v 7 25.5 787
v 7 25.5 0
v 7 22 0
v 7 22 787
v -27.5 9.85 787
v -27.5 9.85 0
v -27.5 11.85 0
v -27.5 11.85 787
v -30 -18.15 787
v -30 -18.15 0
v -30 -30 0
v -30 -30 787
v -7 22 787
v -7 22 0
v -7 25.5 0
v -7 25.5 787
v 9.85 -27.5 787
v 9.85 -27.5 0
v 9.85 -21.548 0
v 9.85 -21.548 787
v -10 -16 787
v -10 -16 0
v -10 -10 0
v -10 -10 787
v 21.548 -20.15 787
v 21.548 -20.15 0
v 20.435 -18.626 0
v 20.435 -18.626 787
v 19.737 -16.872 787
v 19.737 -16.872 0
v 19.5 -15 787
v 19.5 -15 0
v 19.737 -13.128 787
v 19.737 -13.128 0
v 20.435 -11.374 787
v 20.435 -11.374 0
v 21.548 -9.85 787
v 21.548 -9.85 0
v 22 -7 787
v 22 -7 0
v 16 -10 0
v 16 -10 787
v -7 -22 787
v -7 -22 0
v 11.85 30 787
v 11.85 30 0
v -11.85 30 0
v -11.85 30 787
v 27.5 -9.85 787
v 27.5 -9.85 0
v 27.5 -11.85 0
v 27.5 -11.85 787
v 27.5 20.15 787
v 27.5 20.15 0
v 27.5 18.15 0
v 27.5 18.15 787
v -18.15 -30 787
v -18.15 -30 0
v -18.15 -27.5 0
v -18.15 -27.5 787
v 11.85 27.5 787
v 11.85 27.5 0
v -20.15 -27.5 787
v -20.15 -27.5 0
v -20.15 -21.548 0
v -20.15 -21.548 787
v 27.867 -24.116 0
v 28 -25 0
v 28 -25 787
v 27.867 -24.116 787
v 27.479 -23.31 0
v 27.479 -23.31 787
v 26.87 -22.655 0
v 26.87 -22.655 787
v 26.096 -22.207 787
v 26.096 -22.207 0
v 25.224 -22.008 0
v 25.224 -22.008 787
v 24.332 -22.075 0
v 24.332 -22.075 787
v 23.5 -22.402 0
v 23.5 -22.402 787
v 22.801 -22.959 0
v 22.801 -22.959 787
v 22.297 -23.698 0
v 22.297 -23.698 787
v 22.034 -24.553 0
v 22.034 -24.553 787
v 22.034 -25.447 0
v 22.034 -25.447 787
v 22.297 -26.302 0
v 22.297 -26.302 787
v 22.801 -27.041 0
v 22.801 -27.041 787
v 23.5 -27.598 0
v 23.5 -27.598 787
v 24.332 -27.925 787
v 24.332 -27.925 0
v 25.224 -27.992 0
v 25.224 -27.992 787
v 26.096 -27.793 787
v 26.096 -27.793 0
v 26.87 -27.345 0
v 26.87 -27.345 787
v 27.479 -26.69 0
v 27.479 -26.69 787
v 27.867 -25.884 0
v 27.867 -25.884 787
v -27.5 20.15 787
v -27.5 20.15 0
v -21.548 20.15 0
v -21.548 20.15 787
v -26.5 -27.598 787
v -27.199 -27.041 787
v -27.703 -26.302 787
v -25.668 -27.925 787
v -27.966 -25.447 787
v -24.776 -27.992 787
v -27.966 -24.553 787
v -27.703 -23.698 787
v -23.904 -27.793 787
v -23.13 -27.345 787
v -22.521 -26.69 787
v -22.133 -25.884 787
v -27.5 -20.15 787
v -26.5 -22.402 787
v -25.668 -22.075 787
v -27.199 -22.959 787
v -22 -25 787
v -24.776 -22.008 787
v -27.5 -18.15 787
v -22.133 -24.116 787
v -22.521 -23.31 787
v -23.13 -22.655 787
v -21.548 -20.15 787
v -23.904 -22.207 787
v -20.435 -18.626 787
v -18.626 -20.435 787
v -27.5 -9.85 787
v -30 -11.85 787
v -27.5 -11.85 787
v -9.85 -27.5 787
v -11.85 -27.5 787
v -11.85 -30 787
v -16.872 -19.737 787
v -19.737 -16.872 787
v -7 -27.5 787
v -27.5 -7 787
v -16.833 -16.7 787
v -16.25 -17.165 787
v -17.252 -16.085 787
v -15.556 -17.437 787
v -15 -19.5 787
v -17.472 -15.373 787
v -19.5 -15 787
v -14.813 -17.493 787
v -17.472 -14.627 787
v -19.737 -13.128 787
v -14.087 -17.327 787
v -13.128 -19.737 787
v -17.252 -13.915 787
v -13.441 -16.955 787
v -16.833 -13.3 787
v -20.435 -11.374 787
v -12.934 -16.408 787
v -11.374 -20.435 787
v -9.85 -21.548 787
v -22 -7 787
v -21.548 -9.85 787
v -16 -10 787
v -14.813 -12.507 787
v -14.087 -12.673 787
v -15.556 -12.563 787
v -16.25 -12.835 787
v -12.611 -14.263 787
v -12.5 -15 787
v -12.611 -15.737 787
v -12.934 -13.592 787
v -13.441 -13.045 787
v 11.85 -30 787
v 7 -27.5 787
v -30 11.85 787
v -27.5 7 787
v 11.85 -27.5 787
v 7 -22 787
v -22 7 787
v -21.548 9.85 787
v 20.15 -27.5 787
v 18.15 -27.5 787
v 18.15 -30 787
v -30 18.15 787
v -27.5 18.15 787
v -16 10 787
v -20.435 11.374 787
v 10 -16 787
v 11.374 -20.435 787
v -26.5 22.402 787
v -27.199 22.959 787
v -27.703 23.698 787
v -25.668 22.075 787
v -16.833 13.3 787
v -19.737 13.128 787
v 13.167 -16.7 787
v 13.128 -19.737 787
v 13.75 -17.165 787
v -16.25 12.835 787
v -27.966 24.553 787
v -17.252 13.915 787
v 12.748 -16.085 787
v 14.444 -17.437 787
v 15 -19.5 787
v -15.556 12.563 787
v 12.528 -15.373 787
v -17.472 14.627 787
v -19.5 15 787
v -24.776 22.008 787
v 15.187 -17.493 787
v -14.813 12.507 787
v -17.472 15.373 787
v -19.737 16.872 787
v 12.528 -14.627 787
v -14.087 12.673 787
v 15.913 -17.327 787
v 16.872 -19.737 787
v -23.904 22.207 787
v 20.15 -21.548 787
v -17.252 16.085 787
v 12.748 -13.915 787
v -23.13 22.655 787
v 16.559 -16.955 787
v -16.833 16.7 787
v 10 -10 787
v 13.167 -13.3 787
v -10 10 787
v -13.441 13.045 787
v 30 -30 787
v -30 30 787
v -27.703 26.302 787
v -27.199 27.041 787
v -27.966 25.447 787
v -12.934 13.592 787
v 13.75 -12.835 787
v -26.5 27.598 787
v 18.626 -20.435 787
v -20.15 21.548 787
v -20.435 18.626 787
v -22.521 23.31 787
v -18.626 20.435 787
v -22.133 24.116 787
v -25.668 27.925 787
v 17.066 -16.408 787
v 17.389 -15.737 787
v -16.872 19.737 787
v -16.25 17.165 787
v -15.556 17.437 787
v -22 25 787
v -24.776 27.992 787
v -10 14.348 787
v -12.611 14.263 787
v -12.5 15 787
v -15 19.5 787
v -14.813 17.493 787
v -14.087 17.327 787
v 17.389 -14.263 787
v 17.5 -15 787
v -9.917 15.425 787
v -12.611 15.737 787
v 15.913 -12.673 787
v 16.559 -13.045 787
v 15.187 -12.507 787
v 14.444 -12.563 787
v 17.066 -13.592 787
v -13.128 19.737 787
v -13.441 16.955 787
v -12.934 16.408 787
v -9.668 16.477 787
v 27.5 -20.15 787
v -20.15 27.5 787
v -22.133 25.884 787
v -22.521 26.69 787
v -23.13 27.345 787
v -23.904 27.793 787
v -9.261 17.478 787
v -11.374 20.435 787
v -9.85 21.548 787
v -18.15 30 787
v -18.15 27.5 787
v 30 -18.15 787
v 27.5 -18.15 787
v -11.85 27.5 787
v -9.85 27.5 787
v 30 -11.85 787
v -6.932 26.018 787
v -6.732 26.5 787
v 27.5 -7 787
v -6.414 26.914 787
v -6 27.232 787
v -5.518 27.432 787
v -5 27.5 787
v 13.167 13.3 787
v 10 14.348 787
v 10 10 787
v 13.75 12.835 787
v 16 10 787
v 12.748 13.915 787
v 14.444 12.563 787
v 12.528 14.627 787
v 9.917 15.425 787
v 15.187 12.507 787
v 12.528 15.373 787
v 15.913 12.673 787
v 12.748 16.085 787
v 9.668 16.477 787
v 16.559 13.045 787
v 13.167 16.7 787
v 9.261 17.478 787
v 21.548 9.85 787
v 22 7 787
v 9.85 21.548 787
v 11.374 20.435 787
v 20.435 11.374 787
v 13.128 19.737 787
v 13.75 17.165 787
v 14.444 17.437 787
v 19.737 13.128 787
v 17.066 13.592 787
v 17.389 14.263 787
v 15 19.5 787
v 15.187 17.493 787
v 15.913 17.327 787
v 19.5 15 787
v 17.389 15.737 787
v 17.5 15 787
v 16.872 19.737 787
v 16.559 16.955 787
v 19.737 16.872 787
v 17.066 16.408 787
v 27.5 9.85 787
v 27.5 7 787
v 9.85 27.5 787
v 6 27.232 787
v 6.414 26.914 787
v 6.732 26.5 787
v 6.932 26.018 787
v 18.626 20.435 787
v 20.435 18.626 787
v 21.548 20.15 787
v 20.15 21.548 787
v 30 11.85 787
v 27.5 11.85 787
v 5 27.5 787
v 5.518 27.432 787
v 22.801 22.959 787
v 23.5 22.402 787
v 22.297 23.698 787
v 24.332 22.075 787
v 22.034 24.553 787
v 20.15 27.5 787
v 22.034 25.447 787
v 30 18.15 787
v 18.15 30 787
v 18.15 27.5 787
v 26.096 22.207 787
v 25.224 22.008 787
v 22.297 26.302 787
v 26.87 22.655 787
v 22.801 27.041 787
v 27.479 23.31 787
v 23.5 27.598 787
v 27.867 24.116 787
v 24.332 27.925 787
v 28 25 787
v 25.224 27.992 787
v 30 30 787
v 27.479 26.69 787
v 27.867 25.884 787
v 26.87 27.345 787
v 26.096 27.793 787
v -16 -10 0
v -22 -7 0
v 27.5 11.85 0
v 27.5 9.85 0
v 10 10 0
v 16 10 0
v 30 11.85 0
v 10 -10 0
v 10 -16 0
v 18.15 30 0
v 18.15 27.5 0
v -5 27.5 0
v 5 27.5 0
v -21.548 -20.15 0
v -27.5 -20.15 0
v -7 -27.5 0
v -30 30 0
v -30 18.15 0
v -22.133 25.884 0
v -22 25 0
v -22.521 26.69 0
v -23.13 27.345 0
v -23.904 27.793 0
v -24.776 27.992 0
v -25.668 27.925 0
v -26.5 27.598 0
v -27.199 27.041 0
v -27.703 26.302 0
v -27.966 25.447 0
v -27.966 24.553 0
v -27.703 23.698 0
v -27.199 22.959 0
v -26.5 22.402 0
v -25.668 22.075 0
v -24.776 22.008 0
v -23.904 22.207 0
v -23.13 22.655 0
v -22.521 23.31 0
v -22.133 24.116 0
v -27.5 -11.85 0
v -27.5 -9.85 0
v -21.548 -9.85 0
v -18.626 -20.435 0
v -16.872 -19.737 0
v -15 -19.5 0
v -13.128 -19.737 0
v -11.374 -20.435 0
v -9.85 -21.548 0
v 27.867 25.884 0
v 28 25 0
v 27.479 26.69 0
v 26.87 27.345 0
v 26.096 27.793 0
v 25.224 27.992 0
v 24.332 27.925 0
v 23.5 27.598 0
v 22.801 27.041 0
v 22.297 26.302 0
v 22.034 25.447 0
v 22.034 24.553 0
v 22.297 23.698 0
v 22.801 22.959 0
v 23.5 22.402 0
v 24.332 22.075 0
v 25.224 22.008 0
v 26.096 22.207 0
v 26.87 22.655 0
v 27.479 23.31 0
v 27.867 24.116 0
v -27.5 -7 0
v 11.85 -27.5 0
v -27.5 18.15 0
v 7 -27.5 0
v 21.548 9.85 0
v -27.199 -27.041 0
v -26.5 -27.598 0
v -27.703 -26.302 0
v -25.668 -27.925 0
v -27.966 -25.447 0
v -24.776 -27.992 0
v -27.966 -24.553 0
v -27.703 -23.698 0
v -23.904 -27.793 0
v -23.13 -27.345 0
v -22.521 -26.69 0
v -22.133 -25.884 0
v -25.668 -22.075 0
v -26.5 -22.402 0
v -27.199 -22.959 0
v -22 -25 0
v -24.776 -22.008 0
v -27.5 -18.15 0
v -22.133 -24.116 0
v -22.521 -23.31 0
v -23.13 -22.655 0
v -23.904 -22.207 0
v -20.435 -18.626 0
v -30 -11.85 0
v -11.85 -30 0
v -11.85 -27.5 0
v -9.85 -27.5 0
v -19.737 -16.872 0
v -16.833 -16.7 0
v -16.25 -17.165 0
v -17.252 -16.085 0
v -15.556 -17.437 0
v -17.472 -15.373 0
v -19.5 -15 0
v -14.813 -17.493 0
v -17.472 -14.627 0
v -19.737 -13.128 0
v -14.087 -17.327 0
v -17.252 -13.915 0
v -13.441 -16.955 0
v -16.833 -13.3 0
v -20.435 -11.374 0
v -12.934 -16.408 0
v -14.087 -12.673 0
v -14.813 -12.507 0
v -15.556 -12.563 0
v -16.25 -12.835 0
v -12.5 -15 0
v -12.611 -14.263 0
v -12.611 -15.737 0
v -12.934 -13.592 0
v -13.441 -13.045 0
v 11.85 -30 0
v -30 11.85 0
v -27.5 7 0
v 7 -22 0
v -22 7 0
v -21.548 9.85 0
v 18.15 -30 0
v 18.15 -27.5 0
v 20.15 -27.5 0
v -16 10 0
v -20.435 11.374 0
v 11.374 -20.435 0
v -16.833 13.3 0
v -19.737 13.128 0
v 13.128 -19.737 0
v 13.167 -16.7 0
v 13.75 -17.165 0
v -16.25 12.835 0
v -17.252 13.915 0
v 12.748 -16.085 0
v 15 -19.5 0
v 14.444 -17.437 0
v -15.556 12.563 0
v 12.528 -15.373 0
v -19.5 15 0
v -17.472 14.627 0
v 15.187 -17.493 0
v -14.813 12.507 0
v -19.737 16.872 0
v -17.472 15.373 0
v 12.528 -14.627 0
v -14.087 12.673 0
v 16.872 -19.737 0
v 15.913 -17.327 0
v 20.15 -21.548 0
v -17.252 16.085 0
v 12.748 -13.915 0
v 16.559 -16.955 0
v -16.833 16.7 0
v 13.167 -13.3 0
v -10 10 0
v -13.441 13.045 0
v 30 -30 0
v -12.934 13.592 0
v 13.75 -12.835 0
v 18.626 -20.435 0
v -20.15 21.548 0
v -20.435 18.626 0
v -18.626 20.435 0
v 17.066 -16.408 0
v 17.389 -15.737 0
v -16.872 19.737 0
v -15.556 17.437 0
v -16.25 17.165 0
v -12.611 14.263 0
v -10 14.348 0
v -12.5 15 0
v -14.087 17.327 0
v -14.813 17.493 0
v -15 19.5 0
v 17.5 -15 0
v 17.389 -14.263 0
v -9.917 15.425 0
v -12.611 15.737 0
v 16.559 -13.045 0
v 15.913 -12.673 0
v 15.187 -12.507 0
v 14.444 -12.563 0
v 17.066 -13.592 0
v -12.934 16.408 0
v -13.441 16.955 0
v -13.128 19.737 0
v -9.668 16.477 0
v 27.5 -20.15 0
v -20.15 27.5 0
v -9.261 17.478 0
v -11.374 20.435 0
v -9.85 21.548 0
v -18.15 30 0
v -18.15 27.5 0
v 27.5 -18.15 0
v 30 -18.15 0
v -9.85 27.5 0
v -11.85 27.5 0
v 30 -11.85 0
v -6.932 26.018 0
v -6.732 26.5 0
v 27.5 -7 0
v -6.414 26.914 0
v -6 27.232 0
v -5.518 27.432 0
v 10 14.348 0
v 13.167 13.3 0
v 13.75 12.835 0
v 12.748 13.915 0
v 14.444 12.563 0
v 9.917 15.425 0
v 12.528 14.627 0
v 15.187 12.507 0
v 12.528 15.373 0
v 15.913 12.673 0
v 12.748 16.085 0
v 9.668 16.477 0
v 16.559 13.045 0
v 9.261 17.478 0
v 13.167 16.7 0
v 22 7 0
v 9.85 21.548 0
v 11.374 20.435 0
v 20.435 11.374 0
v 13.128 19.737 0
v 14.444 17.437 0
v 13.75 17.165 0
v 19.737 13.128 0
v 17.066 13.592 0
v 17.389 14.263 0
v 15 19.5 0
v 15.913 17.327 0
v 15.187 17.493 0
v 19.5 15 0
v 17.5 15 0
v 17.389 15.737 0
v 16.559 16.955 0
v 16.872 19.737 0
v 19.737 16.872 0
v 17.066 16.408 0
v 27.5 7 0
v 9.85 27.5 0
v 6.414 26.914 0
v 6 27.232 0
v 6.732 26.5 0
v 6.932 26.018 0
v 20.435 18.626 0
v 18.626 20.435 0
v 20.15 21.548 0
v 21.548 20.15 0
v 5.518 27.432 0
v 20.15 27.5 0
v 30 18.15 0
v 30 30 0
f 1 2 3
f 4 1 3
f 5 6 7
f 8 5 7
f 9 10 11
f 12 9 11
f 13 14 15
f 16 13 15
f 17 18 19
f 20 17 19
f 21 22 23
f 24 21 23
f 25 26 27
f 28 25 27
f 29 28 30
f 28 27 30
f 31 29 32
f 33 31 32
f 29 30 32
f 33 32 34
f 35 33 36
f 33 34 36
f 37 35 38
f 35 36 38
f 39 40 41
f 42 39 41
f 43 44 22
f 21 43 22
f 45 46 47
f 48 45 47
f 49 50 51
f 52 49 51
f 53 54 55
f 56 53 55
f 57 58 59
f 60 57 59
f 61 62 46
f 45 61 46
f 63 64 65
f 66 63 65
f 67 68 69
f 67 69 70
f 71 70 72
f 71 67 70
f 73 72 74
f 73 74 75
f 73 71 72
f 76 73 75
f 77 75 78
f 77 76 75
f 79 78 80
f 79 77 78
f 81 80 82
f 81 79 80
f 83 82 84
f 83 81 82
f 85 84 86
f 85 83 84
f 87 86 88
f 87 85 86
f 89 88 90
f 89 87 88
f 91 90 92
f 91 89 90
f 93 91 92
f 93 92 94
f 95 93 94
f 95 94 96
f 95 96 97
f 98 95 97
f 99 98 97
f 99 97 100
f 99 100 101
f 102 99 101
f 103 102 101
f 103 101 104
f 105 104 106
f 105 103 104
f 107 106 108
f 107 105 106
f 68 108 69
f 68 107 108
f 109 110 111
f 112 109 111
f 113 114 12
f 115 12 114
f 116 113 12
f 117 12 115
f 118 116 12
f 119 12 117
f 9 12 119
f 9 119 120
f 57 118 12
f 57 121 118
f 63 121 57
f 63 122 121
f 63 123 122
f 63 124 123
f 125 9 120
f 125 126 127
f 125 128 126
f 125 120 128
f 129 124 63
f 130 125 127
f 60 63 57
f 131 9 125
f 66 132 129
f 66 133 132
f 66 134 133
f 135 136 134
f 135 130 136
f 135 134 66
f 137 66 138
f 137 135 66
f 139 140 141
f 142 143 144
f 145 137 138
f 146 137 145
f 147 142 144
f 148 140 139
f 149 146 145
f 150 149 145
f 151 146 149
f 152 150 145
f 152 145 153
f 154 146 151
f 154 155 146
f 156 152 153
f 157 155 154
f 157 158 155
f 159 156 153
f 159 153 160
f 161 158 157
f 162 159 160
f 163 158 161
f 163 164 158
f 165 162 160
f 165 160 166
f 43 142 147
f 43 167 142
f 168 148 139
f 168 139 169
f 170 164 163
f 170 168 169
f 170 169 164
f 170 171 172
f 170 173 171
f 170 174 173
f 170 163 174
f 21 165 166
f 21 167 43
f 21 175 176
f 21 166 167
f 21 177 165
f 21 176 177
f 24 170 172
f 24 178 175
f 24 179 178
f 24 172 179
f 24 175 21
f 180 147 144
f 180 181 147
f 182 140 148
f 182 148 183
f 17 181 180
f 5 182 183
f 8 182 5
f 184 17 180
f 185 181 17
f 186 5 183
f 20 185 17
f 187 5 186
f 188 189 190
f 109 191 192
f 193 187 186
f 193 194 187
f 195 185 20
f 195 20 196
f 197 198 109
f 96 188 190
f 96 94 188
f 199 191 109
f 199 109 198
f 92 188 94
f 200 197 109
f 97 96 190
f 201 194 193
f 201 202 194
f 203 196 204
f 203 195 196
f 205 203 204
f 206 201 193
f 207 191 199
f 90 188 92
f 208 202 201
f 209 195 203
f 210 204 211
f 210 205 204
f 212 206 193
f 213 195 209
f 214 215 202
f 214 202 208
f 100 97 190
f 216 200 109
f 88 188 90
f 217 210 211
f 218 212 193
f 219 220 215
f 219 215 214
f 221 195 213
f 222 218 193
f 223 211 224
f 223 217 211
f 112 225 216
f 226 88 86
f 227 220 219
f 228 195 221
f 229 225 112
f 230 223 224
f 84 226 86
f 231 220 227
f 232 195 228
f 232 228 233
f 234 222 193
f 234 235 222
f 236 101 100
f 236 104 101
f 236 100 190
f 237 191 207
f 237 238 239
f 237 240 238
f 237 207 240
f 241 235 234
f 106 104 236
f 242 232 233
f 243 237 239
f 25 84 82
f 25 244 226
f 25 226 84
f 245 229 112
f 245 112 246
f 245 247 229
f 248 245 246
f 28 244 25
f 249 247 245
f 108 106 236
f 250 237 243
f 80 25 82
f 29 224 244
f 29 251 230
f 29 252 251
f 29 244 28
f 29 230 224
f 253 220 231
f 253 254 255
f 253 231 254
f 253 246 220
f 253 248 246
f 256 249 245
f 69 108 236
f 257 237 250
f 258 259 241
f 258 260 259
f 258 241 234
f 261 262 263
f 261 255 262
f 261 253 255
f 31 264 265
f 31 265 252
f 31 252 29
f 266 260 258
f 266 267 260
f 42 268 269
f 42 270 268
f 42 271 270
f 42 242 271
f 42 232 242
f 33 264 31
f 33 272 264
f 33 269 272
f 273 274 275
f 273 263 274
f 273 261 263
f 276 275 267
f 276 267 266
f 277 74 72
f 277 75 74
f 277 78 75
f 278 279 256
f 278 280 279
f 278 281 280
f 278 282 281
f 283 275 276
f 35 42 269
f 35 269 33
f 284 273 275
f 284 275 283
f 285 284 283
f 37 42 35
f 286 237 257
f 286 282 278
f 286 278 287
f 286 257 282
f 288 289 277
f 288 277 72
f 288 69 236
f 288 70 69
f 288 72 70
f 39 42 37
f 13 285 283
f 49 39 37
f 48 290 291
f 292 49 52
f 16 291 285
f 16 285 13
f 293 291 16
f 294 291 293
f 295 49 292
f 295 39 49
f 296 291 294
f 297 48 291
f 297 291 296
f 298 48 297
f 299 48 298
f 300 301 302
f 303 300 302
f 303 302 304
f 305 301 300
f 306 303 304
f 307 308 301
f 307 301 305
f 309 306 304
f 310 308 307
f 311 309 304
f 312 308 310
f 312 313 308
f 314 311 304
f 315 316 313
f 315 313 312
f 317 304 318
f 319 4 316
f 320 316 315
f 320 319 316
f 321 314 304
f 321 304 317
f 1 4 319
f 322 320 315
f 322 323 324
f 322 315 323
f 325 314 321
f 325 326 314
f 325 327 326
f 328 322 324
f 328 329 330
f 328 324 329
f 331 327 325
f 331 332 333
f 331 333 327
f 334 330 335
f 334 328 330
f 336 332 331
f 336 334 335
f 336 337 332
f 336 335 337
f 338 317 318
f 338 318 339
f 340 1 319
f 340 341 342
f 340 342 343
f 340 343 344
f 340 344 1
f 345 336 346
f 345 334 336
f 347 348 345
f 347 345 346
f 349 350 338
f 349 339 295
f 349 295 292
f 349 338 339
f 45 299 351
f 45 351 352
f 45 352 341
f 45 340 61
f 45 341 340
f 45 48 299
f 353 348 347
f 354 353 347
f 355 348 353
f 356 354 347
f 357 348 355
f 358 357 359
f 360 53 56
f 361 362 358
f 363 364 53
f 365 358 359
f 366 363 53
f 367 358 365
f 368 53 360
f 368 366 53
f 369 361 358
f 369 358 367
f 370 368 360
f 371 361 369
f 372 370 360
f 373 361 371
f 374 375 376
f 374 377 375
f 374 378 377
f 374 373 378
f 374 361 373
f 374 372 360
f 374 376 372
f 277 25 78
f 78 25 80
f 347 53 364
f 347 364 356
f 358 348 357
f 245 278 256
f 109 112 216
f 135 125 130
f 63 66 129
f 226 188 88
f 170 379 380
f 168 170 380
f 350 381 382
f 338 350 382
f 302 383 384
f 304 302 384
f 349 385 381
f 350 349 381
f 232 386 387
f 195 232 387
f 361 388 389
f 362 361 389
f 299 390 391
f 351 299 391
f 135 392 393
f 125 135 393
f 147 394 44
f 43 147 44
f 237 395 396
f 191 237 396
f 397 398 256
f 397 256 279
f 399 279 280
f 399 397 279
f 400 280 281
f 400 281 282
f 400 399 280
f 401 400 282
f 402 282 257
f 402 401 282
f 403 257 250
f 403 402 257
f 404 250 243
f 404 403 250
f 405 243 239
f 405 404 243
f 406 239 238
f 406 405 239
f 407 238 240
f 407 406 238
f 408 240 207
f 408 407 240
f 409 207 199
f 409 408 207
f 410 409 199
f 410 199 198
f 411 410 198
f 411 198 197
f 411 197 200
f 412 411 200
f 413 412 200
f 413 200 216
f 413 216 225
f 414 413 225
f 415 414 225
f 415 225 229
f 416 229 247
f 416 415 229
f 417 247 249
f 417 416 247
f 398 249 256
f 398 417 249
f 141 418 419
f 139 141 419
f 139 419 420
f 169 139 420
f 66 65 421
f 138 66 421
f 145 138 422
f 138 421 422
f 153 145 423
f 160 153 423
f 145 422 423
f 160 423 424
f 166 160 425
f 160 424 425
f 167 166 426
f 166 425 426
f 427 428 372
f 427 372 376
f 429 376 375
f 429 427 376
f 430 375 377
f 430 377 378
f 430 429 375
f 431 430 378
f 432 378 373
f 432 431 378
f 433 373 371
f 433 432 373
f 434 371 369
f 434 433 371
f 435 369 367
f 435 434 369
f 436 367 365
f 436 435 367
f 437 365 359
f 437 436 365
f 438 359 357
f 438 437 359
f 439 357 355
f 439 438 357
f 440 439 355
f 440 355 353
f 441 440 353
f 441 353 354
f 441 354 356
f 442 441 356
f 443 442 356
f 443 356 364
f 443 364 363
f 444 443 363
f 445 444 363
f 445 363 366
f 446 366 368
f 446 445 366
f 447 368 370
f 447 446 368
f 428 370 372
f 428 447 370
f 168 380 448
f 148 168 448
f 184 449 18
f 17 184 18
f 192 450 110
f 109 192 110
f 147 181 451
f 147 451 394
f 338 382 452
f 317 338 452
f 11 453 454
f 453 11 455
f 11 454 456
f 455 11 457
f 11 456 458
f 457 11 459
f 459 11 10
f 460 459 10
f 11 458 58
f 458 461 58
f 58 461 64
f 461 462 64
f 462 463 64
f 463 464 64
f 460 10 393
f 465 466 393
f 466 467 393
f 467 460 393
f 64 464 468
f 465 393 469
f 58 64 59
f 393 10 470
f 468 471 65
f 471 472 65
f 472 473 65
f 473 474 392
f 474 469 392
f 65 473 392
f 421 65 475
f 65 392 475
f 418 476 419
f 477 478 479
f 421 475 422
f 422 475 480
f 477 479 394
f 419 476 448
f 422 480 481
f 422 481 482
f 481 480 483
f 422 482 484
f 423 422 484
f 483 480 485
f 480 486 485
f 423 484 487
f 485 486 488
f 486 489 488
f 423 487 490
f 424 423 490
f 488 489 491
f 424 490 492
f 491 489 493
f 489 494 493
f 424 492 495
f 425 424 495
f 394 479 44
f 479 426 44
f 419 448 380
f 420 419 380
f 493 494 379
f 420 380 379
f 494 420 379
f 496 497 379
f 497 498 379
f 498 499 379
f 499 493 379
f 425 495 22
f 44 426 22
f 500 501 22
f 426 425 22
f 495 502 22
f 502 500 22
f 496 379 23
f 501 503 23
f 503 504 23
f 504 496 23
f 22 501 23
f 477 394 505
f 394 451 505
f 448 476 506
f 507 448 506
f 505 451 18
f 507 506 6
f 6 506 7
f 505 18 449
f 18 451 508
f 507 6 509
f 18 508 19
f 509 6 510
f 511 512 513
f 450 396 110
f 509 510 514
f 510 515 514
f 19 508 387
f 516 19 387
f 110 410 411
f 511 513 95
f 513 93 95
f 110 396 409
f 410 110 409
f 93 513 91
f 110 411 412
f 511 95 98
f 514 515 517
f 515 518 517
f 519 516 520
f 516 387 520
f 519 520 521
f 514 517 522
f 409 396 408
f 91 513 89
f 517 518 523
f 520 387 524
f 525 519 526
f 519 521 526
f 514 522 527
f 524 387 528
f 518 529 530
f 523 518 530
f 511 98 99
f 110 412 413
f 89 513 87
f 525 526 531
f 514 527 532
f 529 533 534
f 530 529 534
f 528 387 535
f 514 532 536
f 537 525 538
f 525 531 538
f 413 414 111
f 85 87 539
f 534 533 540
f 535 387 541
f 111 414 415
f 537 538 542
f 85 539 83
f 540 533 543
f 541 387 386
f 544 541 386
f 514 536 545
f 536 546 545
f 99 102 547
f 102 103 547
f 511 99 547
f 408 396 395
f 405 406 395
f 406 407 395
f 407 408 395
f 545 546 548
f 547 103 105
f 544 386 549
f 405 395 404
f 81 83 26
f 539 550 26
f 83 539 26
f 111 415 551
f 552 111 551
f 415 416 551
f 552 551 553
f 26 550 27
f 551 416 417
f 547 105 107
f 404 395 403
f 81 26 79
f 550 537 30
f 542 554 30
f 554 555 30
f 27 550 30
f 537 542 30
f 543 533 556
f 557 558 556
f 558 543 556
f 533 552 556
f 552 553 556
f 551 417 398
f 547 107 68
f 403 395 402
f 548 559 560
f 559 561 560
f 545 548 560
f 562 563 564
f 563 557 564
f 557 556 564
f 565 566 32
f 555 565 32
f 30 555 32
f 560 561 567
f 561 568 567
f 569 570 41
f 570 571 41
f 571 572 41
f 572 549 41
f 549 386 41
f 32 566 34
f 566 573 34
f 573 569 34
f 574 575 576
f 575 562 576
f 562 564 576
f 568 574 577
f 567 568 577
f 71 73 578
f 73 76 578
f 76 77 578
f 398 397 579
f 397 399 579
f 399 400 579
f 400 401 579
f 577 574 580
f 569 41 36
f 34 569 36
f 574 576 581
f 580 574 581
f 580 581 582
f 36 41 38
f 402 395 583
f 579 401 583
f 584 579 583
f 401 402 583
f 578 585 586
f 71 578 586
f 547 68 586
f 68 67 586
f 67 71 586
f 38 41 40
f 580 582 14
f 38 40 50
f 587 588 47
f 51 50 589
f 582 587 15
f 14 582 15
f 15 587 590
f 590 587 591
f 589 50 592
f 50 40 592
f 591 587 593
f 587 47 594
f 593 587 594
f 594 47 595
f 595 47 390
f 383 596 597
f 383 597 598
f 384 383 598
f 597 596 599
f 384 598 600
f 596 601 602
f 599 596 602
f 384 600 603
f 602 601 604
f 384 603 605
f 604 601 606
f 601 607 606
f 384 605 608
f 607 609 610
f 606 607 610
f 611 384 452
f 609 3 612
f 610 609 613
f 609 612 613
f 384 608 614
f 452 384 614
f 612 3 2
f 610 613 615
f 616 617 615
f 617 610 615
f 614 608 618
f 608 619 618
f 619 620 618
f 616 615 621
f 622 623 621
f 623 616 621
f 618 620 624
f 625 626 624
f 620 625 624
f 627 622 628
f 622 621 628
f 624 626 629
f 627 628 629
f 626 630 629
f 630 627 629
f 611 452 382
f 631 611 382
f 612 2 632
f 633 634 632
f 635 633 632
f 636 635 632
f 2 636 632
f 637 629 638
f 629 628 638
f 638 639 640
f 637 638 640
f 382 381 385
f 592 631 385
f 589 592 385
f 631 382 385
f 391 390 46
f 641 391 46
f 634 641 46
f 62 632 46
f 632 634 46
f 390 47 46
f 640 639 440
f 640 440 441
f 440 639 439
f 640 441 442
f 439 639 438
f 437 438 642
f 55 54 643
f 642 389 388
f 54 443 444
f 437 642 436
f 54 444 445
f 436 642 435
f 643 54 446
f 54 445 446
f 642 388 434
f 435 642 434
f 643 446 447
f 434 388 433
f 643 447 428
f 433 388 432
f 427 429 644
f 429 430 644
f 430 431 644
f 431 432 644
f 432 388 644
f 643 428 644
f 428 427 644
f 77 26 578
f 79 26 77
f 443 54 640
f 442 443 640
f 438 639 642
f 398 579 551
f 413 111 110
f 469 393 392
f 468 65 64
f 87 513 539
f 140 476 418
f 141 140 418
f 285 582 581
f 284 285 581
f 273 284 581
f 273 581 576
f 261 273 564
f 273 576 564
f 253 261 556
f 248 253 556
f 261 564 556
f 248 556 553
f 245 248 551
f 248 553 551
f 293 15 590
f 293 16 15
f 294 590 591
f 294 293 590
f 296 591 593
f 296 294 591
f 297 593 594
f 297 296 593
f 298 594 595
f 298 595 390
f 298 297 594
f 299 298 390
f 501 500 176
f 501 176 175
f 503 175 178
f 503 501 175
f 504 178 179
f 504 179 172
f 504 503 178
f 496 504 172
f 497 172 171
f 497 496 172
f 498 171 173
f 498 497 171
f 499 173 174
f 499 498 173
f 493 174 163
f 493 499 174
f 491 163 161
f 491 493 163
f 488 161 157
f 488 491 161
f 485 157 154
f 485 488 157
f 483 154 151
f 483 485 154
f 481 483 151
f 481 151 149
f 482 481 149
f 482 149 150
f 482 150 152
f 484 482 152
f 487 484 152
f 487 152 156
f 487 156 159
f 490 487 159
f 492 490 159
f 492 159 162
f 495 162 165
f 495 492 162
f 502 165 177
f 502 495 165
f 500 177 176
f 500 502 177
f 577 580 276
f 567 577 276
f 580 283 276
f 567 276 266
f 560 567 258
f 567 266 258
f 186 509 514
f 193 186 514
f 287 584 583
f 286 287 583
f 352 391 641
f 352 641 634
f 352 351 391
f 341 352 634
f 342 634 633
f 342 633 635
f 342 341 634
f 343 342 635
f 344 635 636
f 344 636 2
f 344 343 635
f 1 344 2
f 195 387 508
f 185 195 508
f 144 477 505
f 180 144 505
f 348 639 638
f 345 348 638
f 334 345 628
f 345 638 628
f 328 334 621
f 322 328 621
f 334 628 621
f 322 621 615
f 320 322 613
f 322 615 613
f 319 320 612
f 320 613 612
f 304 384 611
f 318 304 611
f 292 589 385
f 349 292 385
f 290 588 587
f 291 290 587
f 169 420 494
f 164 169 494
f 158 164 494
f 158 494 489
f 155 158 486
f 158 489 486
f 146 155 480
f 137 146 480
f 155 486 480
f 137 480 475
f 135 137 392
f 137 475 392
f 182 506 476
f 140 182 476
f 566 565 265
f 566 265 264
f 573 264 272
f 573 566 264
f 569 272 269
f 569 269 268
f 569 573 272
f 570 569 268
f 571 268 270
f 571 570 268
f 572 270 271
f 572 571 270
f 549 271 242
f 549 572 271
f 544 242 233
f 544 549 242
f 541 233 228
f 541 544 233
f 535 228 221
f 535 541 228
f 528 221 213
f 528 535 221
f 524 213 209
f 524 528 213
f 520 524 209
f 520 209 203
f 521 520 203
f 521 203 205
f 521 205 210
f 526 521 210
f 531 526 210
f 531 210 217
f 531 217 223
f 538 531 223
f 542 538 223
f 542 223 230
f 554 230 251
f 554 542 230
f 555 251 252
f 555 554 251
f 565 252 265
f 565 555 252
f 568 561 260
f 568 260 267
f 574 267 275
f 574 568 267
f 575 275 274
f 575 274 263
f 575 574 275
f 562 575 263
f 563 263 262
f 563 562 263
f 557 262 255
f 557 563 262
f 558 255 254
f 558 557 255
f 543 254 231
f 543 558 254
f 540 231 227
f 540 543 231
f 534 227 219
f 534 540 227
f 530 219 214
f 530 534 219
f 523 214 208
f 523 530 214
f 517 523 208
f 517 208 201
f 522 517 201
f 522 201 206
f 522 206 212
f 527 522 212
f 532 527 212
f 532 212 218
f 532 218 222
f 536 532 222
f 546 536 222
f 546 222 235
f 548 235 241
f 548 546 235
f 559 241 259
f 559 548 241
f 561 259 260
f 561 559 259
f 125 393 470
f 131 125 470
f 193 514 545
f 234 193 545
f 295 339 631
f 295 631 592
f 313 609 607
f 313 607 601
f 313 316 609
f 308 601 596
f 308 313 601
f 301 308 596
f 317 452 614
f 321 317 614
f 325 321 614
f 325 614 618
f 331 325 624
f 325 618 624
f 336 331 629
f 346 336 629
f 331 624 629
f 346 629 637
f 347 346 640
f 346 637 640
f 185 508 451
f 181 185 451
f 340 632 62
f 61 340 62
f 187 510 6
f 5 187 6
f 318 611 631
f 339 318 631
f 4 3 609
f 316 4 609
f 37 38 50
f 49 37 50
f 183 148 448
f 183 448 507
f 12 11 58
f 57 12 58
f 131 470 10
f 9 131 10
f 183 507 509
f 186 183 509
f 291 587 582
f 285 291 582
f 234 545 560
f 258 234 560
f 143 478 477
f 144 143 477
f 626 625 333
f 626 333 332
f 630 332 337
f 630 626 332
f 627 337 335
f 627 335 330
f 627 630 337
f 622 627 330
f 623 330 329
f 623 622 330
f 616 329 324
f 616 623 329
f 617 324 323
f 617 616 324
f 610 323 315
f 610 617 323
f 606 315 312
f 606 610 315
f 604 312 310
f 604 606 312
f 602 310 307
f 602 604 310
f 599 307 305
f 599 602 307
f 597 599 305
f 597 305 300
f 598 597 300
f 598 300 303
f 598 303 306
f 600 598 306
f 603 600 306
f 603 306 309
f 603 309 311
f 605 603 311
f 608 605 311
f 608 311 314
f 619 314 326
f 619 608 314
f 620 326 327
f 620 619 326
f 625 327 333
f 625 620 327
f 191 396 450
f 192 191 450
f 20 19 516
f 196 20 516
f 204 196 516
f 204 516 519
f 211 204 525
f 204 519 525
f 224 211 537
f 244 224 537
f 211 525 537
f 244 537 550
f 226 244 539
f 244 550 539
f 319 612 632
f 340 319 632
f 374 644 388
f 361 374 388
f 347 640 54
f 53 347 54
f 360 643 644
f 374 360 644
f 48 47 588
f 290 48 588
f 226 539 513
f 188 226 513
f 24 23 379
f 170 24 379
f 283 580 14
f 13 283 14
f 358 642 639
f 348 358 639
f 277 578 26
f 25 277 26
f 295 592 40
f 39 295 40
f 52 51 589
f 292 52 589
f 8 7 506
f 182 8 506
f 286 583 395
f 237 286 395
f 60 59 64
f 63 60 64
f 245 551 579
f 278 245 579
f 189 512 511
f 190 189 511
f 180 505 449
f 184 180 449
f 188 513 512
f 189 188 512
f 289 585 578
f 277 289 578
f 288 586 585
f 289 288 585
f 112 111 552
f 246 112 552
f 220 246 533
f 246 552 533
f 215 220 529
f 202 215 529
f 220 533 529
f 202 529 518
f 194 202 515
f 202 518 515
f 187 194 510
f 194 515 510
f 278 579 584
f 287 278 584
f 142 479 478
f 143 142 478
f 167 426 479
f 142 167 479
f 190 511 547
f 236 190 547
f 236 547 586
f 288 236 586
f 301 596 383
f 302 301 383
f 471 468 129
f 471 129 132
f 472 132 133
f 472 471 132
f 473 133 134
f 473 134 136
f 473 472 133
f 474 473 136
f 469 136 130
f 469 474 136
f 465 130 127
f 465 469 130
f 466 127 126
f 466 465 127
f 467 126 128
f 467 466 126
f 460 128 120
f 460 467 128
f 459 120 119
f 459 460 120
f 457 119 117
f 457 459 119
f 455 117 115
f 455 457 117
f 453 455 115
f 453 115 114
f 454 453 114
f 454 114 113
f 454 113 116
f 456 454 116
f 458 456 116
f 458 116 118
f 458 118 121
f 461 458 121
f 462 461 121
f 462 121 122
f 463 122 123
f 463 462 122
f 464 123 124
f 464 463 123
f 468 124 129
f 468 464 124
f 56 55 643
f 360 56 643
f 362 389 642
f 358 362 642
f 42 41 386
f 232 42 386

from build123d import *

# Parameters (mm, degrees)
F0_R     = 3
F0_R_2   = 2.5
F1_DEPTH = 787
F2_R     = 2
F3_R     = 7


# Not quite as in the source:
# - a feature names something its author has since deleted; it is built from what else it names


with BuildPart() as f1:
    # F0 (on Top) → F1 (new body)
    with BuildSketch(Plane.XY):
        with BuildLine():
            Line((18.15, -30), (30, -30))
            Line((30, -30), (30, -18.15))
            Line((30, -18.15), (27.5, -18.15))
            Line((27.5, -18.15), (27.5, -20.15))
            Line((27.5, -20.15), (21.5477069044, -20.15))
            ThreePointArc((21.5477069044, -20.15), (19.5, -15), (21.5477069044, -9.85))
            Line((21.5477069044, -9.85), (27.5, -9.85))
            Line((27.5, -9.85), (27.5, -11.85))
            Line((27.5, -11.85), (30, -11.85))
            Line((30, -11.85), (30, 11.85))
            Line((30, 11.85), (27.5, 11.85))
            Line((27.5, 11.85), (27.5, 9.85))
            Line((27.5, 9.85), (21.5477069044, 9.85))
            ThreePointArc((21.5477069044, 9.85), (19.5, 15), (21.5477069044, 20.15))
            Line((21.5477069044, 20.15), (27.5, 20.15))
            Line((27.5, 20.15), (27.5, 18.15))
            Line((27.5, 18.15), (30, 18.15))
            Line((30, 18.15), (30, 30))
            Line((30, 30), (18.15, 30))
            Line((18.15, 30), (18.15, 27.5))
            Line((18.15, 27.5), (20.15, 27.5))
            Line((20.15, 27.5), (20.15, 21.5477069044))
            ThreePointArc((20.15, 21.5477069044), (15, 19.5), (9.85, 21.5477069044))
            Line((9.85, 21.5477069044), (9.85, 27.5))
            Line((9.85, 27.5), (11.85, 27.5))
            Line((11.85, 27.5), (11.85, 30))
            Line((11.85, 30), (-11.85, 30))
            Line((-11.85, 30), (-11.85, 27.5))
            Line((-11.85, 27.5), (-9.85, 27.5))
            Line((-9.85, 27.5), (-9.85, 21.5477069044))
            ThreePointArc((-9.85, 21.5477069044), (-15, 19.5), (-20.15, 21.5477069044))
            Line((-20.15, 21.5477069044), (-20.15, 27.5))
            Line((-20.15, 27.5), (-18.15, 27.5))
            Line((-18.15, 27.5), (-18.15, 30))
            Line((-18.15, 30), (-30, 30))
            Line((-30, 30), (-30, 18.15))
            Line((-30, 18.15), (-27.5, 18.15))
            Line((-27.5, 18.15), (-27.5, 20.15))
            Line((-27.5, 20.15), (-21.5477069044, 20.15))
            ThreePointArc((-21.5477069044, 20.15), (-19.5, 15), (-21.5477069044, 9.85))
            Line((-21.5477069044, 9.85), (-27.5, 9.85))
            Line((-27.5, 9.85), (-27.5, 11.85))
            Line((-27.5, 11.85), (-30, 11.85))
            Line((-30, 11.85), (-30, -11.85))
            Line((-30, -11.85), (-27.5, -11.85))
            Line((-27.5, -11.85), (-27.5, -9.85))
            Line((-27.5, -9.85), (-21.5477069044, -9.85))
            ThreePointArc((-21.5477069044, -9.85), (-19.5, -15), (-21.5477069044, -20.15))
            Line((-21.5477069044, -20.15), (-27.5, -20.15))
            Line((-27.5, -20.15), (-27.5, -18.15))
            Line((-27.5, -18.15), (-30, -18.15))
            Line((-30, -18.15), (-30, -30))
            Line((-30, -30), (-18.15, -30))
            Line((-18.15, -30), (-18.15, -27.5))
            Line((-18.15, -27.5), (-20.15, -27.5))
            Line((-20.15, -27.5), (-20.15, -21.5477069044))
            ThreePointArc((-20.15, -21.5477069044), (-15, -19.5), (-9.85, -21.5477069044))
            Line((-9.85, -21.5477069044), (-9.85, -27.5))
            Line((-9.85, -27.5), (-11.85, -27.5))
            Line((-11.85, -27.5), (-11.85, -30))
            Line((-11.85, -30), (11.85, -30))
            Line((11.85, -30), (11.85, -27.5))
            Line((11.85, -27.5), (9.85, -27.5))
            Line((9.85, -27.5), (9.85, -21.5477069044))
            ThreePointArc((9.85, -21.5477069044), (15, -19.5), (20.15, -21.5477069044))
            Line((20.15, -21.5477069044), (20.15, -27.5))
            Line((20.15, -27.5), (18.15, -27.5))
            Line((18.15, -27.5), (18.15, -30))
        make_face()
        with Locations((-25, -25)):
            Circle(F0_R, mode=Mode.SUBTRACT)
        with Locations((-15, -15)):
            Circle(F0_R_2, mode=Mode.SUBTRACT)
        with Locations((25, -25)):
            Circle(F0_R, mode=Mode.SUBTRACT)
        with Locations((15, -15)):
            Circle(F0_R_2, mode=Mode.SUBTRACT)
        with Locations((-25, 25)):
            Circle(F0_R, mode=Mode.SUBTRACT)
        with Locations((-15, 15)):
            Circle(F0_R_2, mode=Mode.SUBTRACT)
        Polygon((-7, 22), (-7, 27.5), (0, 27.5), (7, 27.5), (7, 22), (10, 16), (10, 10), (16, 10), (22, 7), (27.5, 7), (27.5, 0), (27.5, -7), (22, -7), (16, -10), (10, -10), (10, -16), (7, -22), (7, -27.5), (0, -27.5), (-7, -27.5), (-7, -22), (-10, -16), (-10, -10), (-16, -10), (-22, -7), (-27.5, -7), (-27.5, 0), (-27.5, 7), (-22, 7), (-16, 10), (-10, 10), (-10, 16), align=None, mode=Mode.SUBTRACT)
        with Locations((15, 15)):
            Circle(F0_R_2, mode=Mode.SUBTRACT)
        with Locations((25, 25)):
            Circle(F0_R, mode=Mode.SUBTRACT)
    extrude(amount=F1_DEPTH)

    # F2
    f2_edges = [f1.edges().sort_by_distance(p)[0] for p in [
        (-7, 27.5, 393.5),
        (7, 27.5, 393.5),
    ]]
    fillet(f2_edges, radius=F2_R)

    # F3
    f3_edges = [f1.edges().sort_by_distance(p)[0] for p in [
        (-10, 16, 393.5),
        (10, 16, 393.5),
    ]]
    fillet(f3_edges, radius=F3_R)


solid = f1.part
